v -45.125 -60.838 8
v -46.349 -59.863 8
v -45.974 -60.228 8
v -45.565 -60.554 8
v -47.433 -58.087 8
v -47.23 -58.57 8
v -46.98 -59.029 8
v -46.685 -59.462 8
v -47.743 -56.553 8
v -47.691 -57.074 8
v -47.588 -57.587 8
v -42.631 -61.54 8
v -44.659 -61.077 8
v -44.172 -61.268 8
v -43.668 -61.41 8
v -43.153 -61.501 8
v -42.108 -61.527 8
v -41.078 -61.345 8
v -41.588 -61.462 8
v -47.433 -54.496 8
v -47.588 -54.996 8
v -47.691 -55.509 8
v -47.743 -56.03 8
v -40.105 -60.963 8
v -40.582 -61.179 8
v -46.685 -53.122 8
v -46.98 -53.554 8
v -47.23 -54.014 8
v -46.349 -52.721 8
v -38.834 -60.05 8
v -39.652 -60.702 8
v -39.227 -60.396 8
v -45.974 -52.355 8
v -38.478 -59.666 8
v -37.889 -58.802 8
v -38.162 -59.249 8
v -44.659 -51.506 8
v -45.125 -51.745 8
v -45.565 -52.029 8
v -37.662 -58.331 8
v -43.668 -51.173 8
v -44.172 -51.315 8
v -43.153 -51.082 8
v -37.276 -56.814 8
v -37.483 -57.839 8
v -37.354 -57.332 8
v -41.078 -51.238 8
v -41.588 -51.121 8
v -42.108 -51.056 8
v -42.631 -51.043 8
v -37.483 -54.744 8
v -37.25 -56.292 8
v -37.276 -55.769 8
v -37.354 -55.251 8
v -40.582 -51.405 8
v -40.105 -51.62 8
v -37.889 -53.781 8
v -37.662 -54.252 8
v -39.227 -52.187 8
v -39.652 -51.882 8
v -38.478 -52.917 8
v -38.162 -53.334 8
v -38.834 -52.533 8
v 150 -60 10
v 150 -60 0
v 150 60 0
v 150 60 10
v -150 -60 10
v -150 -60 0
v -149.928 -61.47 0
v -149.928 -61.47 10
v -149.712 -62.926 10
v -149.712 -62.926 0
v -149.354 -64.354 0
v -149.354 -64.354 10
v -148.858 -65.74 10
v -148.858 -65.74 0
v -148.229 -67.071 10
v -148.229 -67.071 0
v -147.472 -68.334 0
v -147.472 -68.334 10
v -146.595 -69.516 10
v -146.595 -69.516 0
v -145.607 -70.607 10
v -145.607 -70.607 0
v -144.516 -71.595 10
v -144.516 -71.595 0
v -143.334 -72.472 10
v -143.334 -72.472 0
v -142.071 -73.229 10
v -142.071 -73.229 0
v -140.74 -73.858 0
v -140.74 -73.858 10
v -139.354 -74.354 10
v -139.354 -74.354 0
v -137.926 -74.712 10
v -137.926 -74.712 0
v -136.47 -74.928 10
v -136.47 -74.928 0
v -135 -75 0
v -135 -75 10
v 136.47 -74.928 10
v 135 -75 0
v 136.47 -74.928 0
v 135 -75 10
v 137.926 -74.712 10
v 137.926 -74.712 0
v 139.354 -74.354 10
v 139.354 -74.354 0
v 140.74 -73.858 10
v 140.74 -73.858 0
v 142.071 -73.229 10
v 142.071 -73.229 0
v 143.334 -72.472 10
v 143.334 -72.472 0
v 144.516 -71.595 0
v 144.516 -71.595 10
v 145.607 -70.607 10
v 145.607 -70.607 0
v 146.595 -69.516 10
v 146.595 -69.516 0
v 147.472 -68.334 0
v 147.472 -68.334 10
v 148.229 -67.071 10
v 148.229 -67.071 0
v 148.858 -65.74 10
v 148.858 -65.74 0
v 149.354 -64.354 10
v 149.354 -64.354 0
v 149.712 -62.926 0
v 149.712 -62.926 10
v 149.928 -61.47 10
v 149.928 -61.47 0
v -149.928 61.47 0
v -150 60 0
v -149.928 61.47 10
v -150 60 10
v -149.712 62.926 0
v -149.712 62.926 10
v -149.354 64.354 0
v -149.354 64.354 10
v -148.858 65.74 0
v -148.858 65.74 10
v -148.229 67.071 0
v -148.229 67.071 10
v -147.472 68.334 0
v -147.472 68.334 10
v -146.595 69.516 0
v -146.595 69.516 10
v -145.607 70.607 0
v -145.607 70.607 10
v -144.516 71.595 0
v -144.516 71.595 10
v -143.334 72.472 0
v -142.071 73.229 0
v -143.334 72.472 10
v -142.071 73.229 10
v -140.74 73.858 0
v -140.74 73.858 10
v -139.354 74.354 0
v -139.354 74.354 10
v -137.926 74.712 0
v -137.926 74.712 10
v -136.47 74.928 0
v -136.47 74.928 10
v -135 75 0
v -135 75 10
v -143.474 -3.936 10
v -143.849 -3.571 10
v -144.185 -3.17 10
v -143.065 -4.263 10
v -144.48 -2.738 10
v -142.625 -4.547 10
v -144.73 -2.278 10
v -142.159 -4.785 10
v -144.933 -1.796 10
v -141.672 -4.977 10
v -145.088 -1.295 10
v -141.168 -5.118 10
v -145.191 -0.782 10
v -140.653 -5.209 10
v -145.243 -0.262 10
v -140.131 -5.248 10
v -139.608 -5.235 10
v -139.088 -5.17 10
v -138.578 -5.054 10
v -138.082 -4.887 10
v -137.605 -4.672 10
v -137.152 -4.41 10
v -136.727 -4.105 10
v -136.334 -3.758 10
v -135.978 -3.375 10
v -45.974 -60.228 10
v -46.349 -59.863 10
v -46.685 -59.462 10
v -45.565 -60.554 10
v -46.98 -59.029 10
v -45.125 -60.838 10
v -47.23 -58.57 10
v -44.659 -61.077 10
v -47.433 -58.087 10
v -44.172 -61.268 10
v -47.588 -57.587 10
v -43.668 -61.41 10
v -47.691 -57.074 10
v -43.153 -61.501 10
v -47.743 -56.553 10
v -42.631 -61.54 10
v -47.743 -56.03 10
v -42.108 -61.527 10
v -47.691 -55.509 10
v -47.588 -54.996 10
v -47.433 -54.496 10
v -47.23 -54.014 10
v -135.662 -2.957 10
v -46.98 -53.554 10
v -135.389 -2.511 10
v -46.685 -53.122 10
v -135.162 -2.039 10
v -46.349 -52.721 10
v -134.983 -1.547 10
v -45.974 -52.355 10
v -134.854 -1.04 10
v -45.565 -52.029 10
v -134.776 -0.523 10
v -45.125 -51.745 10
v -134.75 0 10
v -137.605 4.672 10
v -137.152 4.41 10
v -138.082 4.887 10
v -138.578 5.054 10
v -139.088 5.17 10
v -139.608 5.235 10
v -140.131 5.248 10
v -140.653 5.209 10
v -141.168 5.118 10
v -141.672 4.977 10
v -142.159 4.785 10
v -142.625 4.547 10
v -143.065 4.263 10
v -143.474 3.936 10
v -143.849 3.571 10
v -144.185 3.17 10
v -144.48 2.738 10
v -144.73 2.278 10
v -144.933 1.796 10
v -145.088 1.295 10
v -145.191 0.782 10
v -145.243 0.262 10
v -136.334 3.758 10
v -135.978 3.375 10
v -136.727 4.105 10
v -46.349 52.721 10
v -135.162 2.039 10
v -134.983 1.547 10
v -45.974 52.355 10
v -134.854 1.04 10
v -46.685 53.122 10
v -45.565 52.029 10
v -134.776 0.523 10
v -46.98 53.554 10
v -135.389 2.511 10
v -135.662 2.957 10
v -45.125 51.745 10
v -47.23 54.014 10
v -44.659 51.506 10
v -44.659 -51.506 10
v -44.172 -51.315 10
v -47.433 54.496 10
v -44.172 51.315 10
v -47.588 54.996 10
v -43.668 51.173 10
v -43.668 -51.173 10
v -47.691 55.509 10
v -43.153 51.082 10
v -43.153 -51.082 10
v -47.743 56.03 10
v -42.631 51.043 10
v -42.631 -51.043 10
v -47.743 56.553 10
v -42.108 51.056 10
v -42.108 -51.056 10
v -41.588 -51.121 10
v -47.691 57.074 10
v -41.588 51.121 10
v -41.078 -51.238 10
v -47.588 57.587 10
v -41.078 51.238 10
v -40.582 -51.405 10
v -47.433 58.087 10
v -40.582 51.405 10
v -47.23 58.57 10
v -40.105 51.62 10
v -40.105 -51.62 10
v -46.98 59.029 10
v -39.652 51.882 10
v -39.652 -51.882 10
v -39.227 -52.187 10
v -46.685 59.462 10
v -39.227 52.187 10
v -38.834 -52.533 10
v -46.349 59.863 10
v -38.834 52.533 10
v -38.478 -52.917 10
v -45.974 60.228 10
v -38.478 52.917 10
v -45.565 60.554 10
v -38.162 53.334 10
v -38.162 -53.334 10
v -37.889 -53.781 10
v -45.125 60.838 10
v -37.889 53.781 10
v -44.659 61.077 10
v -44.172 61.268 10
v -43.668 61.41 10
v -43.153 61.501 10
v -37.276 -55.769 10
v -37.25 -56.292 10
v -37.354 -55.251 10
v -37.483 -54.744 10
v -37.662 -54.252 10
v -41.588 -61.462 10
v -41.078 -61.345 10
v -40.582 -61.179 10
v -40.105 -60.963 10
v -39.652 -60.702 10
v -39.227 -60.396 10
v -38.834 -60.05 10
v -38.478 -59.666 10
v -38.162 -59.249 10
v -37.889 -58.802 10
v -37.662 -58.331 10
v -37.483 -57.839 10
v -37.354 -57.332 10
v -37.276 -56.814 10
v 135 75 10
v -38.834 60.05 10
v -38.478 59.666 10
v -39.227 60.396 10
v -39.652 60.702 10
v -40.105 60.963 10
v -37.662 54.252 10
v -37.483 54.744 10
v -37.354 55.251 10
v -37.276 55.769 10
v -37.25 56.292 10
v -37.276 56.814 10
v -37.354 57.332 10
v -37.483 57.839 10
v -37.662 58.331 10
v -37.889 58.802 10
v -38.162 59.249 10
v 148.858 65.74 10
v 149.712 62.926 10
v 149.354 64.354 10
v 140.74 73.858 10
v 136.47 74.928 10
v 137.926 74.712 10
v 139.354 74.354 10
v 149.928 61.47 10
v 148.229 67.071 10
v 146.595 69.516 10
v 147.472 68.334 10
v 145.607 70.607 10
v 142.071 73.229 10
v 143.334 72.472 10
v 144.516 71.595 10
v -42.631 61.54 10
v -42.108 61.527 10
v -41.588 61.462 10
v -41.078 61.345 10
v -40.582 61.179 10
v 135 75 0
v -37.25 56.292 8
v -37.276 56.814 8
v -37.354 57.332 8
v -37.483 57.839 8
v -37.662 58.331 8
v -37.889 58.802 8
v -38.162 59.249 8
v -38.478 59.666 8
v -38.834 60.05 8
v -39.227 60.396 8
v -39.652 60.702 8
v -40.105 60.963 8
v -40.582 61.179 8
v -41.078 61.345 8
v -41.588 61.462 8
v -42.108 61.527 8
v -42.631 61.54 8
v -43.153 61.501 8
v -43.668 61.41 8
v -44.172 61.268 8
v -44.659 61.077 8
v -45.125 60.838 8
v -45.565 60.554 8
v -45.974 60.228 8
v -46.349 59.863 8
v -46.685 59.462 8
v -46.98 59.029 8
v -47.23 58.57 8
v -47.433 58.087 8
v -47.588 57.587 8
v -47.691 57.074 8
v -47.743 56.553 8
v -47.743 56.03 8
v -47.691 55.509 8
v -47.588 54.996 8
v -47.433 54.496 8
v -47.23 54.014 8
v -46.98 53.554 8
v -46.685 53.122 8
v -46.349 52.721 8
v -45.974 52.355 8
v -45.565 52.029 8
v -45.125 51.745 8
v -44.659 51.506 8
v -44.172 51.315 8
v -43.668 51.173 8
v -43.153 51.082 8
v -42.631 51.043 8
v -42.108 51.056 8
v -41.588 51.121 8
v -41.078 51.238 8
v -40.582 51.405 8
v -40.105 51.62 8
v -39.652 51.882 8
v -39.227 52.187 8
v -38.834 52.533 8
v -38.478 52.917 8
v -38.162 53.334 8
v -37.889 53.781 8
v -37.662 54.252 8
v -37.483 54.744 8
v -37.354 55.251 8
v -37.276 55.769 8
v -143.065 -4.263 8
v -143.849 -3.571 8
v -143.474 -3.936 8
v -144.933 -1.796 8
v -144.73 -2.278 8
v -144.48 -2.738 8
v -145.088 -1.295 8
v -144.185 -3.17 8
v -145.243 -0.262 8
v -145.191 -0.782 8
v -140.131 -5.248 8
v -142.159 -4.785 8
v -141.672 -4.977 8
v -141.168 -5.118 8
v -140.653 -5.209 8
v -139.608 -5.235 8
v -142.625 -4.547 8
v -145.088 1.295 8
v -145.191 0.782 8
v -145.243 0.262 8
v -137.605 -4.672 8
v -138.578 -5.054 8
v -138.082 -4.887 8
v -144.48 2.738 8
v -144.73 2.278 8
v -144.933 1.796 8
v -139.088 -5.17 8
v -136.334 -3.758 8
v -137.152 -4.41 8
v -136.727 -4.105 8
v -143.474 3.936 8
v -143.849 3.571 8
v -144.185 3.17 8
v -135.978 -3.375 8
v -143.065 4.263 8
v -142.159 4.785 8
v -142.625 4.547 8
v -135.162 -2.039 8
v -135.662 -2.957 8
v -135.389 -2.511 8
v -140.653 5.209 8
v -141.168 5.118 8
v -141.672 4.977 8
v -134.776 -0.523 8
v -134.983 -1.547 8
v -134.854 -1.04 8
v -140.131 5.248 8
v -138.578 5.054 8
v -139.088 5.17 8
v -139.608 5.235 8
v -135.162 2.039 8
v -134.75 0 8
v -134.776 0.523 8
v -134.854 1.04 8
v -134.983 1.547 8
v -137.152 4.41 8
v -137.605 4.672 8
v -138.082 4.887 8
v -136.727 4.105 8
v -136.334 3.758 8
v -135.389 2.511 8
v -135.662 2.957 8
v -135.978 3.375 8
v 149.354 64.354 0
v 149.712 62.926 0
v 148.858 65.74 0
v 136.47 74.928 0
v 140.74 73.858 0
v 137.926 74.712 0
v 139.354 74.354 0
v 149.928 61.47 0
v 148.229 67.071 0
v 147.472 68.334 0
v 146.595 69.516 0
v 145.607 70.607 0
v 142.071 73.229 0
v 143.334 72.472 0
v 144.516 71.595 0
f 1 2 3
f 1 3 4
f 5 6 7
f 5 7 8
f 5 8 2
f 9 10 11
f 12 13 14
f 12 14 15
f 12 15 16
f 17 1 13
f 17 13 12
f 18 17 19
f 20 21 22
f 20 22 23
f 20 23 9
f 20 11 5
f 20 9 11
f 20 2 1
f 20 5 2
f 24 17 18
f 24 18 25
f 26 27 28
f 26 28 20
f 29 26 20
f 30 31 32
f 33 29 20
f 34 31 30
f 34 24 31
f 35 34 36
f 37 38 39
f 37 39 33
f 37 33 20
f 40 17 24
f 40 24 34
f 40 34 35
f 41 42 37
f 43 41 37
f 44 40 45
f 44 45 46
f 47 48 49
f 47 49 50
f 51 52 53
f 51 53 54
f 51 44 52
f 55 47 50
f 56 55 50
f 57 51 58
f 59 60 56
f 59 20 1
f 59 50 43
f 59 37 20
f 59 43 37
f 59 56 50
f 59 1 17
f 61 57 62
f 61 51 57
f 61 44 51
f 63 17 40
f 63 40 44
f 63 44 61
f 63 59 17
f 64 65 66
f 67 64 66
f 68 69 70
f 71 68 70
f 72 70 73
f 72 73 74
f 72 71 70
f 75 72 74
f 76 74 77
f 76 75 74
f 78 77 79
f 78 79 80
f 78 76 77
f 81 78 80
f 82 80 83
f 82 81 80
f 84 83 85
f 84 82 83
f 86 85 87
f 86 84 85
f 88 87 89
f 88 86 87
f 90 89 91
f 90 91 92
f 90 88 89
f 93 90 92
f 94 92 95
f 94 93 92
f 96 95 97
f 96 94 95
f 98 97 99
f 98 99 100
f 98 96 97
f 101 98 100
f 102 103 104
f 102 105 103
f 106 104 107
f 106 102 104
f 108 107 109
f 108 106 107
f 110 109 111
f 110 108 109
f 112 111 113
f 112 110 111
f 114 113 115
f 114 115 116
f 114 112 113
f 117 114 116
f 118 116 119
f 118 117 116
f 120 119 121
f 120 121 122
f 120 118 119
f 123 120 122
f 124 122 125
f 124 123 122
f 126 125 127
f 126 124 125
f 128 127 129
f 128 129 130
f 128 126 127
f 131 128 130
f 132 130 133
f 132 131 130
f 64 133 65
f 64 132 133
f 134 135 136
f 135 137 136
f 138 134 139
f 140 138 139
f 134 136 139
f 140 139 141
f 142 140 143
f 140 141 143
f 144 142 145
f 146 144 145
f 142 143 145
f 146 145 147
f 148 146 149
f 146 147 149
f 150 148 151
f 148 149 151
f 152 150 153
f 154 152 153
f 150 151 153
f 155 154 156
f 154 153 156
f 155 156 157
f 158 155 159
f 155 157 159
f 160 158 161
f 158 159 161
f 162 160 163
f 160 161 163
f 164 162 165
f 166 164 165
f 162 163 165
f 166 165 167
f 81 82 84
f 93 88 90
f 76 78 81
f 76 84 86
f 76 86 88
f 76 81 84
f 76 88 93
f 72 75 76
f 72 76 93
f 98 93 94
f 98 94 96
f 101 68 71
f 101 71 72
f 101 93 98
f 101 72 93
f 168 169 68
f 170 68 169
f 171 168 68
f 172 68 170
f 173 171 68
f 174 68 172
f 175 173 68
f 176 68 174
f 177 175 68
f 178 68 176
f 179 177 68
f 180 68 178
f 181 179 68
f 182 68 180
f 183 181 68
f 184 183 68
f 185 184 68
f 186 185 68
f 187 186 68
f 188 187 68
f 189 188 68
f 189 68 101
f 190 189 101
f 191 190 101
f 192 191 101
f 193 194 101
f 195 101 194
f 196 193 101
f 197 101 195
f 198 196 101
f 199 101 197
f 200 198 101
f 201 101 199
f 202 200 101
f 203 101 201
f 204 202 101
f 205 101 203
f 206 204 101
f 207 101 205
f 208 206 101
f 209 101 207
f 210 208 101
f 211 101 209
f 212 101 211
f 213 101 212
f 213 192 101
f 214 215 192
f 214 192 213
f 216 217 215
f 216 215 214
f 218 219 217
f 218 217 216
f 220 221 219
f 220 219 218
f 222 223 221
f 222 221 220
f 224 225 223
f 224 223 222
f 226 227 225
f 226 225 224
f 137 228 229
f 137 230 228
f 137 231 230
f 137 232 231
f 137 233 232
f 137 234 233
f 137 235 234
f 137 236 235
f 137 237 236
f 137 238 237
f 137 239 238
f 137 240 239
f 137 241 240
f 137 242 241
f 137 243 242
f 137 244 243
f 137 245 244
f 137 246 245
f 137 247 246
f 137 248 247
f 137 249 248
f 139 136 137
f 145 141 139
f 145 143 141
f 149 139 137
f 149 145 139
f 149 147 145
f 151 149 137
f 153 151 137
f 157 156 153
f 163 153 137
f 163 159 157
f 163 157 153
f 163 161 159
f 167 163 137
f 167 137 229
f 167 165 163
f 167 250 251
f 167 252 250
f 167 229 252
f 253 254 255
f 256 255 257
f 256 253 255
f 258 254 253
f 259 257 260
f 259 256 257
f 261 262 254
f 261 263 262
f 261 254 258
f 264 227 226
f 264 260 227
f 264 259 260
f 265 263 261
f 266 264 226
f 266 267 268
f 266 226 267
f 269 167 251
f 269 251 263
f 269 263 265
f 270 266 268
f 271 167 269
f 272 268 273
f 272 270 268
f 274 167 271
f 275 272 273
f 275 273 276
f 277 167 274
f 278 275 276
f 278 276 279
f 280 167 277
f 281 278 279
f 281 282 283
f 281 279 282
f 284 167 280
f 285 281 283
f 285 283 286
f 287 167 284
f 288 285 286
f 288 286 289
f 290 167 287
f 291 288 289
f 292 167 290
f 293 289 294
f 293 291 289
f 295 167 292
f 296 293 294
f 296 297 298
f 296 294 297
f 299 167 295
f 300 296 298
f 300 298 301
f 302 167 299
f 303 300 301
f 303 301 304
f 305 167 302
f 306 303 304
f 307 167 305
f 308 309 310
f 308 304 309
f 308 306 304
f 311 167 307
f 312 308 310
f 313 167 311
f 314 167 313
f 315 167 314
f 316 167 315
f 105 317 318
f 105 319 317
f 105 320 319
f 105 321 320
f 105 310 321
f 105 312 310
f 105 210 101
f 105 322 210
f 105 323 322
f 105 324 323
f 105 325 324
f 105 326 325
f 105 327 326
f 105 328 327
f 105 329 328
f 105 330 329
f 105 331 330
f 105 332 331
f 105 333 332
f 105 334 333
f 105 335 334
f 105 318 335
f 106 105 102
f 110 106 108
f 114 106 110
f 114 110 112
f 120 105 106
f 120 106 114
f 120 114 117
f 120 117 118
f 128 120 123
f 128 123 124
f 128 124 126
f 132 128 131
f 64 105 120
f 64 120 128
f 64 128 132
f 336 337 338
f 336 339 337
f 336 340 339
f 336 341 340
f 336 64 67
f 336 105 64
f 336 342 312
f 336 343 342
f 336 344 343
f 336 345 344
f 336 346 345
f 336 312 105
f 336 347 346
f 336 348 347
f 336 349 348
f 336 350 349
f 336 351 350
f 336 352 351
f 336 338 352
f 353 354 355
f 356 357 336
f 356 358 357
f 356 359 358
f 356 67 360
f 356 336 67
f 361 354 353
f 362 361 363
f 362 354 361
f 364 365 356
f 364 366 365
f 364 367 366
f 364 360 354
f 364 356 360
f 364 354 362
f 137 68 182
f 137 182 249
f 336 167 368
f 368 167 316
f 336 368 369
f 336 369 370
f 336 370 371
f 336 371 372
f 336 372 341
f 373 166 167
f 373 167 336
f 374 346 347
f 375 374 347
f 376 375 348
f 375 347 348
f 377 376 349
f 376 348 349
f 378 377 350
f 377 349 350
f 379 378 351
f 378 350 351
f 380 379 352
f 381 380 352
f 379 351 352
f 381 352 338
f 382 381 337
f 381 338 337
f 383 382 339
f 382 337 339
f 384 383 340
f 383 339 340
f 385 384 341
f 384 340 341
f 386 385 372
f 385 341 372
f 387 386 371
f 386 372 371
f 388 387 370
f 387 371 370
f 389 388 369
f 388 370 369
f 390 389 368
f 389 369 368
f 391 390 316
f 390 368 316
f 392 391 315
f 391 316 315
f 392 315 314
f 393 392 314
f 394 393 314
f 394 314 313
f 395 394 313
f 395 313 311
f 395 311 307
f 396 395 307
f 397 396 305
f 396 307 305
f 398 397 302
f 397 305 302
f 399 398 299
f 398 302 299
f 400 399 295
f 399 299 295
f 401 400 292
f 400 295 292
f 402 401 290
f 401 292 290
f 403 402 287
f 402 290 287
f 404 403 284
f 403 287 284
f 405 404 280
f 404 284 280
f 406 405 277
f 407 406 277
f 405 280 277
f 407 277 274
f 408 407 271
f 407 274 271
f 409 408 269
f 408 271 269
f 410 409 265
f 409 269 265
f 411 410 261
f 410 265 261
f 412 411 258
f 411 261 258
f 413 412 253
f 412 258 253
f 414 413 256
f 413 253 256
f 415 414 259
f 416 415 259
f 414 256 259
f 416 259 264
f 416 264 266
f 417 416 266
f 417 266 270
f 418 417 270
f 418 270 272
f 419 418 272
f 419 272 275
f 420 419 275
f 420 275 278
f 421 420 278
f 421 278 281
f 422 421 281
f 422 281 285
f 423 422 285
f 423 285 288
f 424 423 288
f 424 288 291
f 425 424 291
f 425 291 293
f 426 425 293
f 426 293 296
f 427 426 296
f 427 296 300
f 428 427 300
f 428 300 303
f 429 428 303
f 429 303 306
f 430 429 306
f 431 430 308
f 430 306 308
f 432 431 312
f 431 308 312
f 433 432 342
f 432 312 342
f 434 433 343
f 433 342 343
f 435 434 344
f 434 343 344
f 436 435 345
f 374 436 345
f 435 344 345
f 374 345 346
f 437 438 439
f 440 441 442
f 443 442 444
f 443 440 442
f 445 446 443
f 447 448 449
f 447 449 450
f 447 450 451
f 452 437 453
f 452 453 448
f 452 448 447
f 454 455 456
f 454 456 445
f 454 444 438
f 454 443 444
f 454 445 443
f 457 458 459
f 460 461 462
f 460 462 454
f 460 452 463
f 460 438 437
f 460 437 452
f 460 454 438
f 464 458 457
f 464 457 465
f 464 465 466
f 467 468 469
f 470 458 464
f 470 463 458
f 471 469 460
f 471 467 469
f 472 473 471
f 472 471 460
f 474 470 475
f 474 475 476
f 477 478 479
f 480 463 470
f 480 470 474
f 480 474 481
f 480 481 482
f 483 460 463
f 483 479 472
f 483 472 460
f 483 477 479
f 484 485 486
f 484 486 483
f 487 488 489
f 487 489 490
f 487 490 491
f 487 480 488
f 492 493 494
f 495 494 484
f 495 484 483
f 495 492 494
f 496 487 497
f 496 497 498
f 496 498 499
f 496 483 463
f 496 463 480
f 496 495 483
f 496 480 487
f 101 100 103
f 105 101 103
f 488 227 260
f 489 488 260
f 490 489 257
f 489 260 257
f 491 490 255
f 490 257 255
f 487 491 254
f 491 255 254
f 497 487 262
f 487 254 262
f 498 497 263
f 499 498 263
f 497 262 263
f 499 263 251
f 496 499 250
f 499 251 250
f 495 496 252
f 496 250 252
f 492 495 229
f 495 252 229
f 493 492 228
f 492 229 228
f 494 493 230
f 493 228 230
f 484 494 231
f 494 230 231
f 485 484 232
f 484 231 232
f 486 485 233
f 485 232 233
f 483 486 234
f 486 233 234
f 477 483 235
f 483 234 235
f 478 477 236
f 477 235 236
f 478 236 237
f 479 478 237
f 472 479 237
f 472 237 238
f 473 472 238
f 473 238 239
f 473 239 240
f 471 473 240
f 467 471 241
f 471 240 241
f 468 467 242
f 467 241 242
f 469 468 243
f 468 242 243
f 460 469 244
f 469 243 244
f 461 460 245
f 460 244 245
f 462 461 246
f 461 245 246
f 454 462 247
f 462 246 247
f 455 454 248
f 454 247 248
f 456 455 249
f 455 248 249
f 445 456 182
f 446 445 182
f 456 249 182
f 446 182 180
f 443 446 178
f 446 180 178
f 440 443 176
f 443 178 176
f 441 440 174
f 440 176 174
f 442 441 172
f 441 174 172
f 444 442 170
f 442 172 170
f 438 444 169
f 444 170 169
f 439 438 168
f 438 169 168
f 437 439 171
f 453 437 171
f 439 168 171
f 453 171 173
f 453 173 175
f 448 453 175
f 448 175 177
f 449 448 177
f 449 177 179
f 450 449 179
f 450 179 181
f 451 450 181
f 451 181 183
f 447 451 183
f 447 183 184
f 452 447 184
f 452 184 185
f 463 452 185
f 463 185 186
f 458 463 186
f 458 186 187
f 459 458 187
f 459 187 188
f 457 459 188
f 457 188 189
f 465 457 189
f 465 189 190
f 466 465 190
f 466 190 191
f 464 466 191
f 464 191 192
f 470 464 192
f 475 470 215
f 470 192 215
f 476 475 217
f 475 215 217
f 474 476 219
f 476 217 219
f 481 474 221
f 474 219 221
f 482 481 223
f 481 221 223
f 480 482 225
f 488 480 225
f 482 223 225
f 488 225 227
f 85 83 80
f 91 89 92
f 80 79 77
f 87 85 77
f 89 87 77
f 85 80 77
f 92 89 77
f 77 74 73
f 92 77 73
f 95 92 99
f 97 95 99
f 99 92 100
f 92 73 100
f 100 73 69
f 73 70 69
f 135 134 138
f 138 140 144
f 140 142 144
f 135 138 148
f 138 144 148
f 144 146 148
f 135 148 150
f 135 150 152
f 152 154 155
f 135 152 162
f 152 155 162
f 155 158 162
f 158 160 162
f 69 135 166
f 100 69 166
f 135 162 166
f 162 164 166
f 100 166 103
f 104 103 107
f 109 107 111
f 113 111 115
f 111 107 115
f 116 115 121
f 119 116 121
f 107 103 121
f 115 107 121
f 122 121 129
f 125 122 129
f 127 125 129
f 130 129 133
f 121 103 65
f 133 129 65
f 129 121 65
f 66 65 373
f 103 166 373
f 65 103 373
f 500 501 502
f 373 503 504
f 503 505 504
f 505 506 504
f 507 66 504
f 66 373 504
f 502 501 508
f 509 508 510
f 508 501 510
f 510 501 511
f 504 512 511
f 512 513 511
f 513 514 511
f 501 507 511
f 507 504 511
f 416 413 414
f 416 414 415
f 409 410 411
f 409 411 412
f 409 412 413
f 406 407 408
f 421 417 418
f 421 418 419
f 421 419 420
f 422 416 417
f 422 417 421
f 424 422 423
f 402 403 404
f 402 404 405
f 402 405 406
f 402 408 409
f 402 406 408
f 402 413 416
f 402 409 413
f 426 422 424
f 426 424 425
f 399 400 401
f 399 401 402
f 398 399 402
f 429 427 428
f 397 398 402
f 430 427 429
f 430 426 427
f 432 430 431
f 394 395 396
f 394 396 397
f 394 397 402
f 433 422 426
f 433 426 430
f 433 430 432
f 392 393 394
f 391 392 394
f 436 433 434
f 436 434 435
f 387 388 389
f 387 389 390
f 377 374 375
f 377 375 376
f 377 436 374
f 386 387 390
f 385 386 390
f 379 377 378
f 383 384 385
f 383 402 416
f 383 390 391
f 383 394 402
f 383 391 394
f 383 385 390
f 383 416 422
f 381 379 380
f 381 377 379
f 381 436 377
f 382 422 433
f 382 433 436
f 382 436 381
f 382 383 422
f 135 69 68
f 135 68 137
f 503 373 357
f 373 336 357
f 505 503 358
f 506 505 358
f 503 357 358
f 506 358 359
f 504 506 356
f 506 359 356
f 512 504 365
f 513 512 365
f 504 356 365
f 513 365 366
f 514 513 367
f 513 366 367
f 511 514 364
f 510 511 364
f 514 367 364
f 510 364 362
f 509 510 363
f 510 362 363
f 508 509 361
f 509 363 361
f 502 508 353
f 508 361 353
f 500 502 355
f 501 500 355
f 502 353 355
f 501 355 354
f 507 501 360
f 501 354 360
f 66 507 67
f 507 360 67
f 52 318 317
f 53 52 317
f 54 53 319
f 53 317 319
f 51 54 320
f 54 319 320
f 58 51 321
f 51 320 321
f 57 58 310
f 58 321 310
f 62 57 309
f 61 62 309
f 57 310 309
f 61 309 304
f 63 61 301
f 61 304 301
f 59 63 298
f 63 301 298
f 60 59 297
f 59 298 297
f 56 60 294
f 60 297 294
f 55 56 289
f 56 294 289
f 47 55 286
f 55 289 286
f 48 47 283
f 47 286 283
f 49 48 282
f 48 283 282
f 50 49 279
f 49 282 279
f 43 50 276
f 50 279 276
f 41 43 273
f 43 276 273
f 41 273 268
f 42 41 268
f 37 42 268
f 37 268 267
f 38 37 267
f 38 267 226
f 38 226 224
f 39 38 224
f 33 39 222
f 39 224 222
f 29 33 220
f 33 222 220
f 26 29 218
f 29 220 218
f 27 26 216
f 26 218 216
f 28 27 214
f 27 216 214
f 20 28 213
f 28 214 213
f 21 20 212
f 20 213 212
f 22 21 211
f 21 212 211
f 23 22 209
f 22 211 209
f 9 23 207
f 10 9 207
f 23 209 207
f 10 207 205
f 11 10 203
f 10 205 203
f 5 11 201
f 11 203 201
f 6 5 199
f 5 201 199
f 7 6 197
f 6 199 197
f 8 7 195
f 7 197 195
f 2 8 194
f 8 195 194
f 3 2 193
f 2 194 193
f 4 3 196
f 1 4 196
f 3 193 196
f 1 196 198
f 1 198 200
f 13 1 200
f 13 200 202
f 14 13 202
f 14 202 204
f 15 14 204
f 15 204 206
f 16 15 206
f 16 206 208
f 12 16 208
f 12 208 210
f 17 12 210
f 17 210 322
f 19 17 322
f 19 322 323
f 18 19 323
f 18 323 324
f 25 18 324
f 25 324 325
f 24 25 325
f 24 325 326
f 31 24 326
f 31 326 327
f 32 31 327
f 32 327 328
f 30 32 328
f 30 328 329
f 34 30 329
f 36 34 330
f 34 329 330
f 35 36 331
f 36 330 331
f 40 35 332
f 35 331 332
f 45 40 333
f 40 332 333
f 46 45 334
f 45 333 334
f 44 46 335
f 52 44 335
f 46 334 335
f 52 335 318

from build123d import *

# Parameters (mm, degrees)
SZKIC1_W                    = 300
SZKIC1_H                    = 150
DODANIE_WYCI_GNI_CIE1_DEPTH = 10
SZKIC2_R                    = 5.25
WYTNIJ_WYCI_GNI_CIE1_DEPTH  = 2
ZAOKR_GLENIE1_R             = 15


with BuildPart() as part:
    # Szkic1 → Dodanie-wyciągnięcie1 (new body)
    with BuildSketch(Plane.XY):
        Rectangle(SZKIC1_W, SZKIC1_H)
    extrude(amount=DODANIE_WYCI_GNI_CIE1_DEPTH)

    # Szkic2 → Wytnij-wyciągnięcie1 (cut)
    with BuildSketch(Plane.XY.offset(10)):
        with Locations((-140, 0)):
            Circle(SZKIC2_R)
        with Locations((-42.5, 56.291651246)):
            Circle(SZKIC2_R)
        with Locations((-42.5, -56.291651246)):
            Circle(SZKIC2_R)
    extrude(amount=-WYTNIJ_WYCI_GNI_CIE1_DEPTH, mode=Mode.SUBTRACT)

    # Zaokrąglenie1
    zaokr_glenie1_edges = [part.edges().sort_by_distance(p)[0] for p in [
        (150, -75, 5),
        (-150, -75, 5),
        (-150, 75, 5),
        (150, 75, 5),
    ]]
    fillet(zaokr_glenie1_edges, radius=ZAOKR_GLENIE1_R)


solid = part.part
